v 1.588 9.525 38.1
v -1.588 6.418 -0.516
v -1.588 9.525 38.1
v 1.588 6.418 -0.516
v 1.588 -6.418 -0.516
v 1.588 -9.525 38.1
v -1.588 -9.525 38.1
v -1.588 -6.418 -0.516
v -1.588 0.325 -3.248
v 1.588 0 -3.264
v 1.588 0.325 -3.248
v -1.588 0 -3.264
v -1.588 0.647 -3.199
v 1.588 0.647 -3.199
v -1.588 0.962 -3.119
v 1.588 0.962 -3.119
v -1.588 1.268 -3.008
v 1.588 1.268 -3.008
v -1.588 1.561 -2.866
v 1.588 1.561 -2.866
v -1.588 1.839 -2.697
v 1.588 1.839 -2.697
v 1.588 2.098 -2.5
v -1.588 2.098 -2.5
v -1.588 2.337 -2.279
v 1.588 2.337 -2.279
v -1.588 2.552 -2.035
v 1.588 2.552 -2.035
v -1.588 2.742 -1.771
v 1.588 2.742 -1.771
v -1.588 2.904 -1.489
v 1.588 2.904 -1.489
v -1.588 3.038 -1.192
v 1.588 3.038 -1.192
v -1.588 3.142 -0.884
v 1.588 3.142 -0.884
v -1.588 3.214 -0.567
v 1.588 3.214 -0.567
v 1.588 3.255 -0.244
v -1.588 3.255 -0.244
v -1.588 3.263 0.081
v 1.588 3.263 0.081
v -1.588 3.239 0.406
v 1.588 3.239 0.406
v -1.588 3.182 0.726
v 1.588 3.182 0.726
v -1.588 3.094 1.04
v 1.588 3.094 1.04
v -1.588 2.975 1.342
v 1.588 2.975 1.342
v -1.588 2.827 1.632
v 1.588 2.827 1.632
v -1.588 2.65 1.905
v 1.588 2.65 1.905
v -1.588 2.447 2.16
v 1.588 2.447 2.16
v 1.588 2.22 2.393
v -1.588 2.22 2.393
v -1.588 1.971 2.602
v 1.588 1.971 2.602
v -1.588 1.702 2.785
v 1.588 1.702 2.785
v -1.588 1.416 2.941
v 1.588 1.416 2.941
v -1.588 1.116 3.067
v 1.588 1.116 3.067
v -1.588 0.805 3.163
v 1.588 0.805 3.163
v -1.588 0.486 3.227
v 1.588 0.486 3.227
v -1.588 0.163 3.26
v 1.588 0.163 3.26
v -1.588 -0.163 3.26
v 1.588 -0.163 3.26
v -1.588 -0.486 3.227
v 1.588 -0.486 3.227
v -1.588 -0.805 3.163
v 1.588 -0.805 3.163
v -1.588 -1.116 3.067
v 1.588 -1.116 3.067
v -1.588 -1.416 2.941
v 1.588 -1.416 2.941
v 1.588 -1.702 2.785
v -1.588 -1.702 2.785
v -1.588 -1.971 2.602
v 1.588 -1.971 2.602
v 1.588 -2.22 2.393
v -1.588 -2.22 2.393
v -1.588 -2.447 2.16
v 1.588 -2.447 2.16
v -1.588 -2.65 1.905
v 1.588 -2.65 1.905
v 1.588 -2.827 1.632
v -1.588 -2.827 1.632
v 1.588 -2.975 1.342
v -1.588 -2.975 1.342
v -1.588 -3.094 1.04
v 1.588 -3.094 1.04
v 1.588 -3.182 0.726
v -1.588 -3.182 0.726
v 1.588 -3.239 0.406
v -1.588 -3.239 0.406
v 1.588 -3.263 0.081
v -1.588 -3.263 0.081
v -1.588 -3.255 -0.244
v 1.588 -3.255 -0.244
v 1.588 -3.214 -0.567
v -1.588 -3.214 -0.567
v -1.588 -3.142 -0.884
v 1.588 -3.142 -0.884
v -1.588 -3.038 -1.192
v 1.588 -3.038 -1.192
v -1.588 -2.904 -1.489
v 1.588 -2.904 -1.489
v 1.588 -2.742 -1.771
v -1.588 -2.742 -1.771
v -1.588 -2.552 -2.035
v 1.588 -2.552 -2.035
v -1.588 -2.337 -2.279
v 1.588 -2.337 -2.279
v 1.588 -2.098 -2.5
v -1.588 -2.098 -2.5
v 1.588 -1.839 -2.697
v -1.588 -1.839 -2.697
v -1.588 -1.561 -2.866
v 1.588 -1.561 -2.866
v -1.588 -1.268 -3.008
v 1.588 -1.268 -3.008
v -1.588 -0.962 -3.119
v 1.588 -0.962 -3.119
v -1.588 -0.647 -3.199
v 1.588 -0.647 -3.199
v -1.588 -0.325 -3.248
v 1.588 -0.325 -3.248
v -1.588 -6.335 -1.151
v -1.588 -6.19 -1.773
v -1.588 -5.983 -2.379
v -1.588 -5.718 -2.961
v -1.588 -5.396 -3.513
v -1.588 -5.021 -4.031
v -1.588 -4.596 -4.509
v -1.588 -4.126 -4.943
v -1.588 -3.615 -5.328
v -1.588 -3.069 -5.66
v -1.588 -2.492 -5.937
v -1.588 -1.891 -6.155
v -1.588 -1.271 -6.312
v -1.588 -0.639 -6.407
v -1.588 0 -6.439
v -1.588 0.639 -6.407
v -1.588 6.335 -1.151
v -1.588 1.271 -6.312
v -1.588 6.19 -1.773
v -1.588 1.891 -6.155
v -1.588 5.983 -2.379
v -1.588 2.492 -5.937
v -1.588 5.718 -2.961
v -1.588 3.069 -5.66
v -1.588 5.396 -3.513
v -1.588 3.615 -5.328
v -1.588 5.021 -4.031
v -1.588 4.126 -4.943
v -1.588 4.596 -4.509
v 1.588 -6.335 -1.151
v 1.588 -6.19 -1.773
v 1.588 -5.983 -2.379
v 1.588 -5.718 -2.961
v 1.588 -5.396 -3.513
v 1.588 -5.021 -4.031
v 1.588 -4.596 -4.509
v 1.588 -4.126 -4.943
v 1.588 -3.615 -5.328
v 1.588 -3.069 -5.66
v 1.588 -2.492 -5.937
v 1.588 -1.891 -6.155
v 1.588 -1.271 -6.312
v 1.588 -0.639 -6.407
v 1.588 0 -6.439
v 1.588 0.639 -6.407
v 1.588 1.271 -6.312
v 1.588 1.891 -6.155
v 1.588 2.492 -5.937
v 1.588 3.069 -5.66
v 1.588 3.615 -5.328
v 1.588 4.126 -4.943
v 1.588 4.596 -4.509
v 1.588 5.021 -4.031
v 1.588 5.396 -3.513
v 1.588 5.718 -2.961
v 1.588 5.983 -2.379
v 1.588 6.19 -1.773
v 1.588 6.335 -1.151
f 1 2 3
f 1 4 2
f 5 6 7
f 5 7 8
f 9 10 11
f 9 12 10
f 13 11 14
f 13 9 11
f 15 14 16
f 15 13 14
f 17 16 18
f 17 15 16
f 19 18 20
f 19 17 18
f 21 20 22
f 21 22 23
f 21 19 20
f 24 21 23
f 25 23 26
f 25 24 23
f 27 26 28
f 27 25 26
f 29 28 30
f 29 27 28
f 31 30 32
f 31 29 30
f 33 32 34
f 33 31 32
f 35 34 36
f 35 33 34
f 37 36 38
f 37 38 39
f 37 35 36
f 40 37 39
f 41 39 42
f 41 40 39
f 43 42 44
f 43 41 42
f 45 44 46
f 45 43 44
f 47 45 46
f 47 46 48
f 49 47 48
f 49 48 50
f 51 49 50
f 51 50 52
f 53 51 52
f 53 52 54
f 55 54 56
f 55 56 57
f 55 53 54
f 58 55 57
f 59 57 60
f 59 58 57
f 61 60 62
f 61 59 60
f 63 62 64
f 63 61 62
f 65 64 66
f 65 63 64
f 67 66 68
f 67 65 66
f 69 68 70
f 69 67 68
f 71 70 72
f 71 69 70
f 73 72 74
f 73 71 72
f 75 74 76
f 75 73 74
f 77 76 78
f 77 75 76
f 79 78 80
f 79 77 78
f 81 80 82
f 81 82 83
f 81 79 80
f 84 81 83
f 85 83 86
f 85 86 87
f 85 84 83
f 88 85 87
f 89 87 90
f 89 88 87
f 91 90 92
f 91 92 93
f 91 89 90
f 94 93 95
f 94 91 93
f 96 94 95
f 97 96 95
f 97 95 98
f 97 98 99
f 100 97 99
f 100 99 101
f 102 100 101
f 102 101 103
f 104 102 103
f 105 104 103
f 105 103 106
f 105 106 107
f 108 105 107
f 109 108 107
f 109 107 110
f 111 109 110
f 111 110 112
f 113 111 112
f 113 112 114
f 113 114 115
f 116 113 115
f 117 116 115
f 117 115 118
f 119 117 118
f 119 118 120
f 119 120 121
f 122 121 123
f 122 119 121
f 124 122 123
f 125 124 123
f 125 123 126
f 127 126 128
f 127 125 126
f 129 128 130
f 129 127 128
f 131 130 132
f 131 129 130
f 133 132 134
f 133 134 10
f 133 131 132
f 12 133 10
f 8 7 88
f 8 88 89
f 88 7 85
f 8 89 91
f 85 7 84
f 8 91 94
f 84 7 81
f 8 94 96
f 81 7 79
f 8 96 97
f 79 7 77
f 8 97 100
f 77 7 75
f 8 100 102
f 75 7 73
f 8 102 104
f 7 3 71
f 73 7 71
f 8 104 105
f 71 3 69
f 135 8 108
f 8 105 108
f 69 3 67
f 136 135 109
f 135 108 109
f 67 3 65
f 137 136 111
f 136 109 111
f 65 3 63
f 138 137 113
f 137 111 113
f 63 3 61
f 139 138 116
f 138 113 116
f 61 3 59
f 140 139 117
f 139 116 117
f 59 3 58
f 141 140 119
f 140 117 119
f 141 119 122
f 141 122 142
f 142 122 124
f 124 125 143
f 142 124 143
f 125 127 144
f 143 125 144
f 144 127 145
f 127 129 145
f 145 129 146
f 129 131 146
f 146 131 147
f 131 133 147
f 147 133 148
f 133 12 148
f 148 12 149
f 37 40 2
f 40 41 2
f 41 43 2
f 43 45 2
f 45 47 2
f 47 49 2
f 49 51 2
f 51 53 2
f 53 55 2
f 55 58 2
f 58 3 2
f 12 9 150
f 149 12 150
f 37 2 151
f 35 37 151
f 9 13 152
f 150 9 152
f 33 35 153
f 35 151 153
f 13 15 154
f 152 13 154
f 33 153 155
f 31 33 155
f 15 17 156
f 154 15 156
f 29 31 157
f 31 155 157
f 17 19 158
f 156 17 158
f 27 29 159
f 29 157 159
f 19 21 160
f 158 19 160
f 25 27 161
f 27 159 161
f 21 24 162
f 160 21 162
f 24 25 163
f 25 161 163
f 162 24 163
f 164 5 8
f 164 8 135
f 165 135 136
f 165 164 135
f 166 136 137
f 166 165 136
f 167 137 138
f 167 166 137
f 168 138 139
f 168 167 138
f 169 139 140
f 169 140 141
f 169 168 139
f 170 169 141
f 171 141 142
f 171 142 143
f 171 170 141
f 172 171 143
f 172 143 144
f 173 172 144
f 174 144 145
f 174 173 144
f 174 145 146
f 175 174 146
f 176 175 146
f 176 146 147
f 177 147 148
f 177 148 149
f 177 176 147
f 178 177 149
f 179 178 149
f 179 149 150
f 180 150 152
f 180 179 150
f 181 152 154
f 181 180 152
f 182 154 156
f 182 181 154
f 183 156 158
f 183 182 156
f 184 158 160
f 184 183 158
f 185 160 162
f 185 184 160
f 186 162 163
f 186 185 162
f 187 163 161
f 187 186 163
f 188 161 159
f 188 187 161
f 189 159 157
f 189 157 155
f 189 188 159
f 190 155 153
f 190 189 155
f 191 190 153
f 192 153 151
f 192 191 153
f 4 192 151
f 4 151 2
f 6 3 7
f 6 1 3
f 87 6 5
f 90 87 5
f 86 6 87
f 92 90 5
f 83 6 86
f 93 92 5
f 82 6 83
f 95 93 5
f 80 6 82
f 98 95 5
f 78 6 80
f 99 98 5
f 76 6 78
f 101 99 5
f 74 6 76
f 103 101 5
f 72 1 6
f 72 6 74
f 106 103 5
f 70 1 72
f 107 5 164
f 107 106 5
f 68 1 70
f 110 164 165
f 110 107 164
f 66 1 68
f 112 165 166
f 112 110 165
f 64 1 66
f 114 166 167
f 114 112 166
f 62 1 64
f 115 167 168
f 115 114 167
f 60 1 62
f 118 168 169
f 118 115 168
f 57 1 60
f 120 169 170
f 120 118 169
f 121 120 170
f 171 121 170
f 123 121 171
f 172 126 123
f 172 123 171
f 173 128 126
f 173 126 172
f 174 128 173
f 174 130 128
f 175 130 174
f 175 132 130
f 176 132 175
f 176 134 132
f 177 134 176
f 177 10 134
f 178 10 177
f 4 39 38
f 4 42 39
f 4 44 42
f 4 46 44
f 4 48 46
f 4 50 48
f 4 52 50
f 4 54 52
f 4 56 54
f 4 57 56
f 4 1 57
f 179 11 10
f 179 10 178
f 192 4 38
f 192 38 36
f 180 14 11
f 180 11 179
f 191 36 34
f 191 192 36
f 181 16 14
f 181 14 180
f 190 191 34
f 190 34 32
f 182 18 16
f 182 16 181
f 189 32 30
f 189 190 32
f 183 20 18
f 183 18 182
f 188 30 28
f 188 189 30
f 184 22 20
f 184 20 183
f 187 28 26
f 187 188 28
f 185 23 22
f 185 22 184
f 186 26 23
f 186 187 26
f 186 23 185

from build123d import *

# Parameters (mm, degrees)
SKETCH1_R           = 3.2639
BOSS_EXTRUDE1_DEPTH = 1.5875


with BuildPart() as part:
    # Sketch1 → Boss-Extrude1 (new, symmetric)
    with BuildSketch(Plane(origin=(0, 0, 0), x_dir=(0, 0, -1), z_dir=(1, 0, 0))):
        with BuildLine():
            Line((-38.1, 9.525), (-38.1, -9.525))
            Line((-38.1, -9.525), (0.516366314, -6.418161656))
            ThreePointArc((0.516366314, -6.418161656), (6.4389, 0), (0.516366314, 6.418161656))
            Line((0.516366314, 6.418161656), (-38.1, 9.525))
        make_face()
        Circle(SKETCH1_R, mode=Mode.SUBTRACT)
    extrude(amount=BOSS_EXTRUDE1_DEPTH, both=True)


solid = part.part
